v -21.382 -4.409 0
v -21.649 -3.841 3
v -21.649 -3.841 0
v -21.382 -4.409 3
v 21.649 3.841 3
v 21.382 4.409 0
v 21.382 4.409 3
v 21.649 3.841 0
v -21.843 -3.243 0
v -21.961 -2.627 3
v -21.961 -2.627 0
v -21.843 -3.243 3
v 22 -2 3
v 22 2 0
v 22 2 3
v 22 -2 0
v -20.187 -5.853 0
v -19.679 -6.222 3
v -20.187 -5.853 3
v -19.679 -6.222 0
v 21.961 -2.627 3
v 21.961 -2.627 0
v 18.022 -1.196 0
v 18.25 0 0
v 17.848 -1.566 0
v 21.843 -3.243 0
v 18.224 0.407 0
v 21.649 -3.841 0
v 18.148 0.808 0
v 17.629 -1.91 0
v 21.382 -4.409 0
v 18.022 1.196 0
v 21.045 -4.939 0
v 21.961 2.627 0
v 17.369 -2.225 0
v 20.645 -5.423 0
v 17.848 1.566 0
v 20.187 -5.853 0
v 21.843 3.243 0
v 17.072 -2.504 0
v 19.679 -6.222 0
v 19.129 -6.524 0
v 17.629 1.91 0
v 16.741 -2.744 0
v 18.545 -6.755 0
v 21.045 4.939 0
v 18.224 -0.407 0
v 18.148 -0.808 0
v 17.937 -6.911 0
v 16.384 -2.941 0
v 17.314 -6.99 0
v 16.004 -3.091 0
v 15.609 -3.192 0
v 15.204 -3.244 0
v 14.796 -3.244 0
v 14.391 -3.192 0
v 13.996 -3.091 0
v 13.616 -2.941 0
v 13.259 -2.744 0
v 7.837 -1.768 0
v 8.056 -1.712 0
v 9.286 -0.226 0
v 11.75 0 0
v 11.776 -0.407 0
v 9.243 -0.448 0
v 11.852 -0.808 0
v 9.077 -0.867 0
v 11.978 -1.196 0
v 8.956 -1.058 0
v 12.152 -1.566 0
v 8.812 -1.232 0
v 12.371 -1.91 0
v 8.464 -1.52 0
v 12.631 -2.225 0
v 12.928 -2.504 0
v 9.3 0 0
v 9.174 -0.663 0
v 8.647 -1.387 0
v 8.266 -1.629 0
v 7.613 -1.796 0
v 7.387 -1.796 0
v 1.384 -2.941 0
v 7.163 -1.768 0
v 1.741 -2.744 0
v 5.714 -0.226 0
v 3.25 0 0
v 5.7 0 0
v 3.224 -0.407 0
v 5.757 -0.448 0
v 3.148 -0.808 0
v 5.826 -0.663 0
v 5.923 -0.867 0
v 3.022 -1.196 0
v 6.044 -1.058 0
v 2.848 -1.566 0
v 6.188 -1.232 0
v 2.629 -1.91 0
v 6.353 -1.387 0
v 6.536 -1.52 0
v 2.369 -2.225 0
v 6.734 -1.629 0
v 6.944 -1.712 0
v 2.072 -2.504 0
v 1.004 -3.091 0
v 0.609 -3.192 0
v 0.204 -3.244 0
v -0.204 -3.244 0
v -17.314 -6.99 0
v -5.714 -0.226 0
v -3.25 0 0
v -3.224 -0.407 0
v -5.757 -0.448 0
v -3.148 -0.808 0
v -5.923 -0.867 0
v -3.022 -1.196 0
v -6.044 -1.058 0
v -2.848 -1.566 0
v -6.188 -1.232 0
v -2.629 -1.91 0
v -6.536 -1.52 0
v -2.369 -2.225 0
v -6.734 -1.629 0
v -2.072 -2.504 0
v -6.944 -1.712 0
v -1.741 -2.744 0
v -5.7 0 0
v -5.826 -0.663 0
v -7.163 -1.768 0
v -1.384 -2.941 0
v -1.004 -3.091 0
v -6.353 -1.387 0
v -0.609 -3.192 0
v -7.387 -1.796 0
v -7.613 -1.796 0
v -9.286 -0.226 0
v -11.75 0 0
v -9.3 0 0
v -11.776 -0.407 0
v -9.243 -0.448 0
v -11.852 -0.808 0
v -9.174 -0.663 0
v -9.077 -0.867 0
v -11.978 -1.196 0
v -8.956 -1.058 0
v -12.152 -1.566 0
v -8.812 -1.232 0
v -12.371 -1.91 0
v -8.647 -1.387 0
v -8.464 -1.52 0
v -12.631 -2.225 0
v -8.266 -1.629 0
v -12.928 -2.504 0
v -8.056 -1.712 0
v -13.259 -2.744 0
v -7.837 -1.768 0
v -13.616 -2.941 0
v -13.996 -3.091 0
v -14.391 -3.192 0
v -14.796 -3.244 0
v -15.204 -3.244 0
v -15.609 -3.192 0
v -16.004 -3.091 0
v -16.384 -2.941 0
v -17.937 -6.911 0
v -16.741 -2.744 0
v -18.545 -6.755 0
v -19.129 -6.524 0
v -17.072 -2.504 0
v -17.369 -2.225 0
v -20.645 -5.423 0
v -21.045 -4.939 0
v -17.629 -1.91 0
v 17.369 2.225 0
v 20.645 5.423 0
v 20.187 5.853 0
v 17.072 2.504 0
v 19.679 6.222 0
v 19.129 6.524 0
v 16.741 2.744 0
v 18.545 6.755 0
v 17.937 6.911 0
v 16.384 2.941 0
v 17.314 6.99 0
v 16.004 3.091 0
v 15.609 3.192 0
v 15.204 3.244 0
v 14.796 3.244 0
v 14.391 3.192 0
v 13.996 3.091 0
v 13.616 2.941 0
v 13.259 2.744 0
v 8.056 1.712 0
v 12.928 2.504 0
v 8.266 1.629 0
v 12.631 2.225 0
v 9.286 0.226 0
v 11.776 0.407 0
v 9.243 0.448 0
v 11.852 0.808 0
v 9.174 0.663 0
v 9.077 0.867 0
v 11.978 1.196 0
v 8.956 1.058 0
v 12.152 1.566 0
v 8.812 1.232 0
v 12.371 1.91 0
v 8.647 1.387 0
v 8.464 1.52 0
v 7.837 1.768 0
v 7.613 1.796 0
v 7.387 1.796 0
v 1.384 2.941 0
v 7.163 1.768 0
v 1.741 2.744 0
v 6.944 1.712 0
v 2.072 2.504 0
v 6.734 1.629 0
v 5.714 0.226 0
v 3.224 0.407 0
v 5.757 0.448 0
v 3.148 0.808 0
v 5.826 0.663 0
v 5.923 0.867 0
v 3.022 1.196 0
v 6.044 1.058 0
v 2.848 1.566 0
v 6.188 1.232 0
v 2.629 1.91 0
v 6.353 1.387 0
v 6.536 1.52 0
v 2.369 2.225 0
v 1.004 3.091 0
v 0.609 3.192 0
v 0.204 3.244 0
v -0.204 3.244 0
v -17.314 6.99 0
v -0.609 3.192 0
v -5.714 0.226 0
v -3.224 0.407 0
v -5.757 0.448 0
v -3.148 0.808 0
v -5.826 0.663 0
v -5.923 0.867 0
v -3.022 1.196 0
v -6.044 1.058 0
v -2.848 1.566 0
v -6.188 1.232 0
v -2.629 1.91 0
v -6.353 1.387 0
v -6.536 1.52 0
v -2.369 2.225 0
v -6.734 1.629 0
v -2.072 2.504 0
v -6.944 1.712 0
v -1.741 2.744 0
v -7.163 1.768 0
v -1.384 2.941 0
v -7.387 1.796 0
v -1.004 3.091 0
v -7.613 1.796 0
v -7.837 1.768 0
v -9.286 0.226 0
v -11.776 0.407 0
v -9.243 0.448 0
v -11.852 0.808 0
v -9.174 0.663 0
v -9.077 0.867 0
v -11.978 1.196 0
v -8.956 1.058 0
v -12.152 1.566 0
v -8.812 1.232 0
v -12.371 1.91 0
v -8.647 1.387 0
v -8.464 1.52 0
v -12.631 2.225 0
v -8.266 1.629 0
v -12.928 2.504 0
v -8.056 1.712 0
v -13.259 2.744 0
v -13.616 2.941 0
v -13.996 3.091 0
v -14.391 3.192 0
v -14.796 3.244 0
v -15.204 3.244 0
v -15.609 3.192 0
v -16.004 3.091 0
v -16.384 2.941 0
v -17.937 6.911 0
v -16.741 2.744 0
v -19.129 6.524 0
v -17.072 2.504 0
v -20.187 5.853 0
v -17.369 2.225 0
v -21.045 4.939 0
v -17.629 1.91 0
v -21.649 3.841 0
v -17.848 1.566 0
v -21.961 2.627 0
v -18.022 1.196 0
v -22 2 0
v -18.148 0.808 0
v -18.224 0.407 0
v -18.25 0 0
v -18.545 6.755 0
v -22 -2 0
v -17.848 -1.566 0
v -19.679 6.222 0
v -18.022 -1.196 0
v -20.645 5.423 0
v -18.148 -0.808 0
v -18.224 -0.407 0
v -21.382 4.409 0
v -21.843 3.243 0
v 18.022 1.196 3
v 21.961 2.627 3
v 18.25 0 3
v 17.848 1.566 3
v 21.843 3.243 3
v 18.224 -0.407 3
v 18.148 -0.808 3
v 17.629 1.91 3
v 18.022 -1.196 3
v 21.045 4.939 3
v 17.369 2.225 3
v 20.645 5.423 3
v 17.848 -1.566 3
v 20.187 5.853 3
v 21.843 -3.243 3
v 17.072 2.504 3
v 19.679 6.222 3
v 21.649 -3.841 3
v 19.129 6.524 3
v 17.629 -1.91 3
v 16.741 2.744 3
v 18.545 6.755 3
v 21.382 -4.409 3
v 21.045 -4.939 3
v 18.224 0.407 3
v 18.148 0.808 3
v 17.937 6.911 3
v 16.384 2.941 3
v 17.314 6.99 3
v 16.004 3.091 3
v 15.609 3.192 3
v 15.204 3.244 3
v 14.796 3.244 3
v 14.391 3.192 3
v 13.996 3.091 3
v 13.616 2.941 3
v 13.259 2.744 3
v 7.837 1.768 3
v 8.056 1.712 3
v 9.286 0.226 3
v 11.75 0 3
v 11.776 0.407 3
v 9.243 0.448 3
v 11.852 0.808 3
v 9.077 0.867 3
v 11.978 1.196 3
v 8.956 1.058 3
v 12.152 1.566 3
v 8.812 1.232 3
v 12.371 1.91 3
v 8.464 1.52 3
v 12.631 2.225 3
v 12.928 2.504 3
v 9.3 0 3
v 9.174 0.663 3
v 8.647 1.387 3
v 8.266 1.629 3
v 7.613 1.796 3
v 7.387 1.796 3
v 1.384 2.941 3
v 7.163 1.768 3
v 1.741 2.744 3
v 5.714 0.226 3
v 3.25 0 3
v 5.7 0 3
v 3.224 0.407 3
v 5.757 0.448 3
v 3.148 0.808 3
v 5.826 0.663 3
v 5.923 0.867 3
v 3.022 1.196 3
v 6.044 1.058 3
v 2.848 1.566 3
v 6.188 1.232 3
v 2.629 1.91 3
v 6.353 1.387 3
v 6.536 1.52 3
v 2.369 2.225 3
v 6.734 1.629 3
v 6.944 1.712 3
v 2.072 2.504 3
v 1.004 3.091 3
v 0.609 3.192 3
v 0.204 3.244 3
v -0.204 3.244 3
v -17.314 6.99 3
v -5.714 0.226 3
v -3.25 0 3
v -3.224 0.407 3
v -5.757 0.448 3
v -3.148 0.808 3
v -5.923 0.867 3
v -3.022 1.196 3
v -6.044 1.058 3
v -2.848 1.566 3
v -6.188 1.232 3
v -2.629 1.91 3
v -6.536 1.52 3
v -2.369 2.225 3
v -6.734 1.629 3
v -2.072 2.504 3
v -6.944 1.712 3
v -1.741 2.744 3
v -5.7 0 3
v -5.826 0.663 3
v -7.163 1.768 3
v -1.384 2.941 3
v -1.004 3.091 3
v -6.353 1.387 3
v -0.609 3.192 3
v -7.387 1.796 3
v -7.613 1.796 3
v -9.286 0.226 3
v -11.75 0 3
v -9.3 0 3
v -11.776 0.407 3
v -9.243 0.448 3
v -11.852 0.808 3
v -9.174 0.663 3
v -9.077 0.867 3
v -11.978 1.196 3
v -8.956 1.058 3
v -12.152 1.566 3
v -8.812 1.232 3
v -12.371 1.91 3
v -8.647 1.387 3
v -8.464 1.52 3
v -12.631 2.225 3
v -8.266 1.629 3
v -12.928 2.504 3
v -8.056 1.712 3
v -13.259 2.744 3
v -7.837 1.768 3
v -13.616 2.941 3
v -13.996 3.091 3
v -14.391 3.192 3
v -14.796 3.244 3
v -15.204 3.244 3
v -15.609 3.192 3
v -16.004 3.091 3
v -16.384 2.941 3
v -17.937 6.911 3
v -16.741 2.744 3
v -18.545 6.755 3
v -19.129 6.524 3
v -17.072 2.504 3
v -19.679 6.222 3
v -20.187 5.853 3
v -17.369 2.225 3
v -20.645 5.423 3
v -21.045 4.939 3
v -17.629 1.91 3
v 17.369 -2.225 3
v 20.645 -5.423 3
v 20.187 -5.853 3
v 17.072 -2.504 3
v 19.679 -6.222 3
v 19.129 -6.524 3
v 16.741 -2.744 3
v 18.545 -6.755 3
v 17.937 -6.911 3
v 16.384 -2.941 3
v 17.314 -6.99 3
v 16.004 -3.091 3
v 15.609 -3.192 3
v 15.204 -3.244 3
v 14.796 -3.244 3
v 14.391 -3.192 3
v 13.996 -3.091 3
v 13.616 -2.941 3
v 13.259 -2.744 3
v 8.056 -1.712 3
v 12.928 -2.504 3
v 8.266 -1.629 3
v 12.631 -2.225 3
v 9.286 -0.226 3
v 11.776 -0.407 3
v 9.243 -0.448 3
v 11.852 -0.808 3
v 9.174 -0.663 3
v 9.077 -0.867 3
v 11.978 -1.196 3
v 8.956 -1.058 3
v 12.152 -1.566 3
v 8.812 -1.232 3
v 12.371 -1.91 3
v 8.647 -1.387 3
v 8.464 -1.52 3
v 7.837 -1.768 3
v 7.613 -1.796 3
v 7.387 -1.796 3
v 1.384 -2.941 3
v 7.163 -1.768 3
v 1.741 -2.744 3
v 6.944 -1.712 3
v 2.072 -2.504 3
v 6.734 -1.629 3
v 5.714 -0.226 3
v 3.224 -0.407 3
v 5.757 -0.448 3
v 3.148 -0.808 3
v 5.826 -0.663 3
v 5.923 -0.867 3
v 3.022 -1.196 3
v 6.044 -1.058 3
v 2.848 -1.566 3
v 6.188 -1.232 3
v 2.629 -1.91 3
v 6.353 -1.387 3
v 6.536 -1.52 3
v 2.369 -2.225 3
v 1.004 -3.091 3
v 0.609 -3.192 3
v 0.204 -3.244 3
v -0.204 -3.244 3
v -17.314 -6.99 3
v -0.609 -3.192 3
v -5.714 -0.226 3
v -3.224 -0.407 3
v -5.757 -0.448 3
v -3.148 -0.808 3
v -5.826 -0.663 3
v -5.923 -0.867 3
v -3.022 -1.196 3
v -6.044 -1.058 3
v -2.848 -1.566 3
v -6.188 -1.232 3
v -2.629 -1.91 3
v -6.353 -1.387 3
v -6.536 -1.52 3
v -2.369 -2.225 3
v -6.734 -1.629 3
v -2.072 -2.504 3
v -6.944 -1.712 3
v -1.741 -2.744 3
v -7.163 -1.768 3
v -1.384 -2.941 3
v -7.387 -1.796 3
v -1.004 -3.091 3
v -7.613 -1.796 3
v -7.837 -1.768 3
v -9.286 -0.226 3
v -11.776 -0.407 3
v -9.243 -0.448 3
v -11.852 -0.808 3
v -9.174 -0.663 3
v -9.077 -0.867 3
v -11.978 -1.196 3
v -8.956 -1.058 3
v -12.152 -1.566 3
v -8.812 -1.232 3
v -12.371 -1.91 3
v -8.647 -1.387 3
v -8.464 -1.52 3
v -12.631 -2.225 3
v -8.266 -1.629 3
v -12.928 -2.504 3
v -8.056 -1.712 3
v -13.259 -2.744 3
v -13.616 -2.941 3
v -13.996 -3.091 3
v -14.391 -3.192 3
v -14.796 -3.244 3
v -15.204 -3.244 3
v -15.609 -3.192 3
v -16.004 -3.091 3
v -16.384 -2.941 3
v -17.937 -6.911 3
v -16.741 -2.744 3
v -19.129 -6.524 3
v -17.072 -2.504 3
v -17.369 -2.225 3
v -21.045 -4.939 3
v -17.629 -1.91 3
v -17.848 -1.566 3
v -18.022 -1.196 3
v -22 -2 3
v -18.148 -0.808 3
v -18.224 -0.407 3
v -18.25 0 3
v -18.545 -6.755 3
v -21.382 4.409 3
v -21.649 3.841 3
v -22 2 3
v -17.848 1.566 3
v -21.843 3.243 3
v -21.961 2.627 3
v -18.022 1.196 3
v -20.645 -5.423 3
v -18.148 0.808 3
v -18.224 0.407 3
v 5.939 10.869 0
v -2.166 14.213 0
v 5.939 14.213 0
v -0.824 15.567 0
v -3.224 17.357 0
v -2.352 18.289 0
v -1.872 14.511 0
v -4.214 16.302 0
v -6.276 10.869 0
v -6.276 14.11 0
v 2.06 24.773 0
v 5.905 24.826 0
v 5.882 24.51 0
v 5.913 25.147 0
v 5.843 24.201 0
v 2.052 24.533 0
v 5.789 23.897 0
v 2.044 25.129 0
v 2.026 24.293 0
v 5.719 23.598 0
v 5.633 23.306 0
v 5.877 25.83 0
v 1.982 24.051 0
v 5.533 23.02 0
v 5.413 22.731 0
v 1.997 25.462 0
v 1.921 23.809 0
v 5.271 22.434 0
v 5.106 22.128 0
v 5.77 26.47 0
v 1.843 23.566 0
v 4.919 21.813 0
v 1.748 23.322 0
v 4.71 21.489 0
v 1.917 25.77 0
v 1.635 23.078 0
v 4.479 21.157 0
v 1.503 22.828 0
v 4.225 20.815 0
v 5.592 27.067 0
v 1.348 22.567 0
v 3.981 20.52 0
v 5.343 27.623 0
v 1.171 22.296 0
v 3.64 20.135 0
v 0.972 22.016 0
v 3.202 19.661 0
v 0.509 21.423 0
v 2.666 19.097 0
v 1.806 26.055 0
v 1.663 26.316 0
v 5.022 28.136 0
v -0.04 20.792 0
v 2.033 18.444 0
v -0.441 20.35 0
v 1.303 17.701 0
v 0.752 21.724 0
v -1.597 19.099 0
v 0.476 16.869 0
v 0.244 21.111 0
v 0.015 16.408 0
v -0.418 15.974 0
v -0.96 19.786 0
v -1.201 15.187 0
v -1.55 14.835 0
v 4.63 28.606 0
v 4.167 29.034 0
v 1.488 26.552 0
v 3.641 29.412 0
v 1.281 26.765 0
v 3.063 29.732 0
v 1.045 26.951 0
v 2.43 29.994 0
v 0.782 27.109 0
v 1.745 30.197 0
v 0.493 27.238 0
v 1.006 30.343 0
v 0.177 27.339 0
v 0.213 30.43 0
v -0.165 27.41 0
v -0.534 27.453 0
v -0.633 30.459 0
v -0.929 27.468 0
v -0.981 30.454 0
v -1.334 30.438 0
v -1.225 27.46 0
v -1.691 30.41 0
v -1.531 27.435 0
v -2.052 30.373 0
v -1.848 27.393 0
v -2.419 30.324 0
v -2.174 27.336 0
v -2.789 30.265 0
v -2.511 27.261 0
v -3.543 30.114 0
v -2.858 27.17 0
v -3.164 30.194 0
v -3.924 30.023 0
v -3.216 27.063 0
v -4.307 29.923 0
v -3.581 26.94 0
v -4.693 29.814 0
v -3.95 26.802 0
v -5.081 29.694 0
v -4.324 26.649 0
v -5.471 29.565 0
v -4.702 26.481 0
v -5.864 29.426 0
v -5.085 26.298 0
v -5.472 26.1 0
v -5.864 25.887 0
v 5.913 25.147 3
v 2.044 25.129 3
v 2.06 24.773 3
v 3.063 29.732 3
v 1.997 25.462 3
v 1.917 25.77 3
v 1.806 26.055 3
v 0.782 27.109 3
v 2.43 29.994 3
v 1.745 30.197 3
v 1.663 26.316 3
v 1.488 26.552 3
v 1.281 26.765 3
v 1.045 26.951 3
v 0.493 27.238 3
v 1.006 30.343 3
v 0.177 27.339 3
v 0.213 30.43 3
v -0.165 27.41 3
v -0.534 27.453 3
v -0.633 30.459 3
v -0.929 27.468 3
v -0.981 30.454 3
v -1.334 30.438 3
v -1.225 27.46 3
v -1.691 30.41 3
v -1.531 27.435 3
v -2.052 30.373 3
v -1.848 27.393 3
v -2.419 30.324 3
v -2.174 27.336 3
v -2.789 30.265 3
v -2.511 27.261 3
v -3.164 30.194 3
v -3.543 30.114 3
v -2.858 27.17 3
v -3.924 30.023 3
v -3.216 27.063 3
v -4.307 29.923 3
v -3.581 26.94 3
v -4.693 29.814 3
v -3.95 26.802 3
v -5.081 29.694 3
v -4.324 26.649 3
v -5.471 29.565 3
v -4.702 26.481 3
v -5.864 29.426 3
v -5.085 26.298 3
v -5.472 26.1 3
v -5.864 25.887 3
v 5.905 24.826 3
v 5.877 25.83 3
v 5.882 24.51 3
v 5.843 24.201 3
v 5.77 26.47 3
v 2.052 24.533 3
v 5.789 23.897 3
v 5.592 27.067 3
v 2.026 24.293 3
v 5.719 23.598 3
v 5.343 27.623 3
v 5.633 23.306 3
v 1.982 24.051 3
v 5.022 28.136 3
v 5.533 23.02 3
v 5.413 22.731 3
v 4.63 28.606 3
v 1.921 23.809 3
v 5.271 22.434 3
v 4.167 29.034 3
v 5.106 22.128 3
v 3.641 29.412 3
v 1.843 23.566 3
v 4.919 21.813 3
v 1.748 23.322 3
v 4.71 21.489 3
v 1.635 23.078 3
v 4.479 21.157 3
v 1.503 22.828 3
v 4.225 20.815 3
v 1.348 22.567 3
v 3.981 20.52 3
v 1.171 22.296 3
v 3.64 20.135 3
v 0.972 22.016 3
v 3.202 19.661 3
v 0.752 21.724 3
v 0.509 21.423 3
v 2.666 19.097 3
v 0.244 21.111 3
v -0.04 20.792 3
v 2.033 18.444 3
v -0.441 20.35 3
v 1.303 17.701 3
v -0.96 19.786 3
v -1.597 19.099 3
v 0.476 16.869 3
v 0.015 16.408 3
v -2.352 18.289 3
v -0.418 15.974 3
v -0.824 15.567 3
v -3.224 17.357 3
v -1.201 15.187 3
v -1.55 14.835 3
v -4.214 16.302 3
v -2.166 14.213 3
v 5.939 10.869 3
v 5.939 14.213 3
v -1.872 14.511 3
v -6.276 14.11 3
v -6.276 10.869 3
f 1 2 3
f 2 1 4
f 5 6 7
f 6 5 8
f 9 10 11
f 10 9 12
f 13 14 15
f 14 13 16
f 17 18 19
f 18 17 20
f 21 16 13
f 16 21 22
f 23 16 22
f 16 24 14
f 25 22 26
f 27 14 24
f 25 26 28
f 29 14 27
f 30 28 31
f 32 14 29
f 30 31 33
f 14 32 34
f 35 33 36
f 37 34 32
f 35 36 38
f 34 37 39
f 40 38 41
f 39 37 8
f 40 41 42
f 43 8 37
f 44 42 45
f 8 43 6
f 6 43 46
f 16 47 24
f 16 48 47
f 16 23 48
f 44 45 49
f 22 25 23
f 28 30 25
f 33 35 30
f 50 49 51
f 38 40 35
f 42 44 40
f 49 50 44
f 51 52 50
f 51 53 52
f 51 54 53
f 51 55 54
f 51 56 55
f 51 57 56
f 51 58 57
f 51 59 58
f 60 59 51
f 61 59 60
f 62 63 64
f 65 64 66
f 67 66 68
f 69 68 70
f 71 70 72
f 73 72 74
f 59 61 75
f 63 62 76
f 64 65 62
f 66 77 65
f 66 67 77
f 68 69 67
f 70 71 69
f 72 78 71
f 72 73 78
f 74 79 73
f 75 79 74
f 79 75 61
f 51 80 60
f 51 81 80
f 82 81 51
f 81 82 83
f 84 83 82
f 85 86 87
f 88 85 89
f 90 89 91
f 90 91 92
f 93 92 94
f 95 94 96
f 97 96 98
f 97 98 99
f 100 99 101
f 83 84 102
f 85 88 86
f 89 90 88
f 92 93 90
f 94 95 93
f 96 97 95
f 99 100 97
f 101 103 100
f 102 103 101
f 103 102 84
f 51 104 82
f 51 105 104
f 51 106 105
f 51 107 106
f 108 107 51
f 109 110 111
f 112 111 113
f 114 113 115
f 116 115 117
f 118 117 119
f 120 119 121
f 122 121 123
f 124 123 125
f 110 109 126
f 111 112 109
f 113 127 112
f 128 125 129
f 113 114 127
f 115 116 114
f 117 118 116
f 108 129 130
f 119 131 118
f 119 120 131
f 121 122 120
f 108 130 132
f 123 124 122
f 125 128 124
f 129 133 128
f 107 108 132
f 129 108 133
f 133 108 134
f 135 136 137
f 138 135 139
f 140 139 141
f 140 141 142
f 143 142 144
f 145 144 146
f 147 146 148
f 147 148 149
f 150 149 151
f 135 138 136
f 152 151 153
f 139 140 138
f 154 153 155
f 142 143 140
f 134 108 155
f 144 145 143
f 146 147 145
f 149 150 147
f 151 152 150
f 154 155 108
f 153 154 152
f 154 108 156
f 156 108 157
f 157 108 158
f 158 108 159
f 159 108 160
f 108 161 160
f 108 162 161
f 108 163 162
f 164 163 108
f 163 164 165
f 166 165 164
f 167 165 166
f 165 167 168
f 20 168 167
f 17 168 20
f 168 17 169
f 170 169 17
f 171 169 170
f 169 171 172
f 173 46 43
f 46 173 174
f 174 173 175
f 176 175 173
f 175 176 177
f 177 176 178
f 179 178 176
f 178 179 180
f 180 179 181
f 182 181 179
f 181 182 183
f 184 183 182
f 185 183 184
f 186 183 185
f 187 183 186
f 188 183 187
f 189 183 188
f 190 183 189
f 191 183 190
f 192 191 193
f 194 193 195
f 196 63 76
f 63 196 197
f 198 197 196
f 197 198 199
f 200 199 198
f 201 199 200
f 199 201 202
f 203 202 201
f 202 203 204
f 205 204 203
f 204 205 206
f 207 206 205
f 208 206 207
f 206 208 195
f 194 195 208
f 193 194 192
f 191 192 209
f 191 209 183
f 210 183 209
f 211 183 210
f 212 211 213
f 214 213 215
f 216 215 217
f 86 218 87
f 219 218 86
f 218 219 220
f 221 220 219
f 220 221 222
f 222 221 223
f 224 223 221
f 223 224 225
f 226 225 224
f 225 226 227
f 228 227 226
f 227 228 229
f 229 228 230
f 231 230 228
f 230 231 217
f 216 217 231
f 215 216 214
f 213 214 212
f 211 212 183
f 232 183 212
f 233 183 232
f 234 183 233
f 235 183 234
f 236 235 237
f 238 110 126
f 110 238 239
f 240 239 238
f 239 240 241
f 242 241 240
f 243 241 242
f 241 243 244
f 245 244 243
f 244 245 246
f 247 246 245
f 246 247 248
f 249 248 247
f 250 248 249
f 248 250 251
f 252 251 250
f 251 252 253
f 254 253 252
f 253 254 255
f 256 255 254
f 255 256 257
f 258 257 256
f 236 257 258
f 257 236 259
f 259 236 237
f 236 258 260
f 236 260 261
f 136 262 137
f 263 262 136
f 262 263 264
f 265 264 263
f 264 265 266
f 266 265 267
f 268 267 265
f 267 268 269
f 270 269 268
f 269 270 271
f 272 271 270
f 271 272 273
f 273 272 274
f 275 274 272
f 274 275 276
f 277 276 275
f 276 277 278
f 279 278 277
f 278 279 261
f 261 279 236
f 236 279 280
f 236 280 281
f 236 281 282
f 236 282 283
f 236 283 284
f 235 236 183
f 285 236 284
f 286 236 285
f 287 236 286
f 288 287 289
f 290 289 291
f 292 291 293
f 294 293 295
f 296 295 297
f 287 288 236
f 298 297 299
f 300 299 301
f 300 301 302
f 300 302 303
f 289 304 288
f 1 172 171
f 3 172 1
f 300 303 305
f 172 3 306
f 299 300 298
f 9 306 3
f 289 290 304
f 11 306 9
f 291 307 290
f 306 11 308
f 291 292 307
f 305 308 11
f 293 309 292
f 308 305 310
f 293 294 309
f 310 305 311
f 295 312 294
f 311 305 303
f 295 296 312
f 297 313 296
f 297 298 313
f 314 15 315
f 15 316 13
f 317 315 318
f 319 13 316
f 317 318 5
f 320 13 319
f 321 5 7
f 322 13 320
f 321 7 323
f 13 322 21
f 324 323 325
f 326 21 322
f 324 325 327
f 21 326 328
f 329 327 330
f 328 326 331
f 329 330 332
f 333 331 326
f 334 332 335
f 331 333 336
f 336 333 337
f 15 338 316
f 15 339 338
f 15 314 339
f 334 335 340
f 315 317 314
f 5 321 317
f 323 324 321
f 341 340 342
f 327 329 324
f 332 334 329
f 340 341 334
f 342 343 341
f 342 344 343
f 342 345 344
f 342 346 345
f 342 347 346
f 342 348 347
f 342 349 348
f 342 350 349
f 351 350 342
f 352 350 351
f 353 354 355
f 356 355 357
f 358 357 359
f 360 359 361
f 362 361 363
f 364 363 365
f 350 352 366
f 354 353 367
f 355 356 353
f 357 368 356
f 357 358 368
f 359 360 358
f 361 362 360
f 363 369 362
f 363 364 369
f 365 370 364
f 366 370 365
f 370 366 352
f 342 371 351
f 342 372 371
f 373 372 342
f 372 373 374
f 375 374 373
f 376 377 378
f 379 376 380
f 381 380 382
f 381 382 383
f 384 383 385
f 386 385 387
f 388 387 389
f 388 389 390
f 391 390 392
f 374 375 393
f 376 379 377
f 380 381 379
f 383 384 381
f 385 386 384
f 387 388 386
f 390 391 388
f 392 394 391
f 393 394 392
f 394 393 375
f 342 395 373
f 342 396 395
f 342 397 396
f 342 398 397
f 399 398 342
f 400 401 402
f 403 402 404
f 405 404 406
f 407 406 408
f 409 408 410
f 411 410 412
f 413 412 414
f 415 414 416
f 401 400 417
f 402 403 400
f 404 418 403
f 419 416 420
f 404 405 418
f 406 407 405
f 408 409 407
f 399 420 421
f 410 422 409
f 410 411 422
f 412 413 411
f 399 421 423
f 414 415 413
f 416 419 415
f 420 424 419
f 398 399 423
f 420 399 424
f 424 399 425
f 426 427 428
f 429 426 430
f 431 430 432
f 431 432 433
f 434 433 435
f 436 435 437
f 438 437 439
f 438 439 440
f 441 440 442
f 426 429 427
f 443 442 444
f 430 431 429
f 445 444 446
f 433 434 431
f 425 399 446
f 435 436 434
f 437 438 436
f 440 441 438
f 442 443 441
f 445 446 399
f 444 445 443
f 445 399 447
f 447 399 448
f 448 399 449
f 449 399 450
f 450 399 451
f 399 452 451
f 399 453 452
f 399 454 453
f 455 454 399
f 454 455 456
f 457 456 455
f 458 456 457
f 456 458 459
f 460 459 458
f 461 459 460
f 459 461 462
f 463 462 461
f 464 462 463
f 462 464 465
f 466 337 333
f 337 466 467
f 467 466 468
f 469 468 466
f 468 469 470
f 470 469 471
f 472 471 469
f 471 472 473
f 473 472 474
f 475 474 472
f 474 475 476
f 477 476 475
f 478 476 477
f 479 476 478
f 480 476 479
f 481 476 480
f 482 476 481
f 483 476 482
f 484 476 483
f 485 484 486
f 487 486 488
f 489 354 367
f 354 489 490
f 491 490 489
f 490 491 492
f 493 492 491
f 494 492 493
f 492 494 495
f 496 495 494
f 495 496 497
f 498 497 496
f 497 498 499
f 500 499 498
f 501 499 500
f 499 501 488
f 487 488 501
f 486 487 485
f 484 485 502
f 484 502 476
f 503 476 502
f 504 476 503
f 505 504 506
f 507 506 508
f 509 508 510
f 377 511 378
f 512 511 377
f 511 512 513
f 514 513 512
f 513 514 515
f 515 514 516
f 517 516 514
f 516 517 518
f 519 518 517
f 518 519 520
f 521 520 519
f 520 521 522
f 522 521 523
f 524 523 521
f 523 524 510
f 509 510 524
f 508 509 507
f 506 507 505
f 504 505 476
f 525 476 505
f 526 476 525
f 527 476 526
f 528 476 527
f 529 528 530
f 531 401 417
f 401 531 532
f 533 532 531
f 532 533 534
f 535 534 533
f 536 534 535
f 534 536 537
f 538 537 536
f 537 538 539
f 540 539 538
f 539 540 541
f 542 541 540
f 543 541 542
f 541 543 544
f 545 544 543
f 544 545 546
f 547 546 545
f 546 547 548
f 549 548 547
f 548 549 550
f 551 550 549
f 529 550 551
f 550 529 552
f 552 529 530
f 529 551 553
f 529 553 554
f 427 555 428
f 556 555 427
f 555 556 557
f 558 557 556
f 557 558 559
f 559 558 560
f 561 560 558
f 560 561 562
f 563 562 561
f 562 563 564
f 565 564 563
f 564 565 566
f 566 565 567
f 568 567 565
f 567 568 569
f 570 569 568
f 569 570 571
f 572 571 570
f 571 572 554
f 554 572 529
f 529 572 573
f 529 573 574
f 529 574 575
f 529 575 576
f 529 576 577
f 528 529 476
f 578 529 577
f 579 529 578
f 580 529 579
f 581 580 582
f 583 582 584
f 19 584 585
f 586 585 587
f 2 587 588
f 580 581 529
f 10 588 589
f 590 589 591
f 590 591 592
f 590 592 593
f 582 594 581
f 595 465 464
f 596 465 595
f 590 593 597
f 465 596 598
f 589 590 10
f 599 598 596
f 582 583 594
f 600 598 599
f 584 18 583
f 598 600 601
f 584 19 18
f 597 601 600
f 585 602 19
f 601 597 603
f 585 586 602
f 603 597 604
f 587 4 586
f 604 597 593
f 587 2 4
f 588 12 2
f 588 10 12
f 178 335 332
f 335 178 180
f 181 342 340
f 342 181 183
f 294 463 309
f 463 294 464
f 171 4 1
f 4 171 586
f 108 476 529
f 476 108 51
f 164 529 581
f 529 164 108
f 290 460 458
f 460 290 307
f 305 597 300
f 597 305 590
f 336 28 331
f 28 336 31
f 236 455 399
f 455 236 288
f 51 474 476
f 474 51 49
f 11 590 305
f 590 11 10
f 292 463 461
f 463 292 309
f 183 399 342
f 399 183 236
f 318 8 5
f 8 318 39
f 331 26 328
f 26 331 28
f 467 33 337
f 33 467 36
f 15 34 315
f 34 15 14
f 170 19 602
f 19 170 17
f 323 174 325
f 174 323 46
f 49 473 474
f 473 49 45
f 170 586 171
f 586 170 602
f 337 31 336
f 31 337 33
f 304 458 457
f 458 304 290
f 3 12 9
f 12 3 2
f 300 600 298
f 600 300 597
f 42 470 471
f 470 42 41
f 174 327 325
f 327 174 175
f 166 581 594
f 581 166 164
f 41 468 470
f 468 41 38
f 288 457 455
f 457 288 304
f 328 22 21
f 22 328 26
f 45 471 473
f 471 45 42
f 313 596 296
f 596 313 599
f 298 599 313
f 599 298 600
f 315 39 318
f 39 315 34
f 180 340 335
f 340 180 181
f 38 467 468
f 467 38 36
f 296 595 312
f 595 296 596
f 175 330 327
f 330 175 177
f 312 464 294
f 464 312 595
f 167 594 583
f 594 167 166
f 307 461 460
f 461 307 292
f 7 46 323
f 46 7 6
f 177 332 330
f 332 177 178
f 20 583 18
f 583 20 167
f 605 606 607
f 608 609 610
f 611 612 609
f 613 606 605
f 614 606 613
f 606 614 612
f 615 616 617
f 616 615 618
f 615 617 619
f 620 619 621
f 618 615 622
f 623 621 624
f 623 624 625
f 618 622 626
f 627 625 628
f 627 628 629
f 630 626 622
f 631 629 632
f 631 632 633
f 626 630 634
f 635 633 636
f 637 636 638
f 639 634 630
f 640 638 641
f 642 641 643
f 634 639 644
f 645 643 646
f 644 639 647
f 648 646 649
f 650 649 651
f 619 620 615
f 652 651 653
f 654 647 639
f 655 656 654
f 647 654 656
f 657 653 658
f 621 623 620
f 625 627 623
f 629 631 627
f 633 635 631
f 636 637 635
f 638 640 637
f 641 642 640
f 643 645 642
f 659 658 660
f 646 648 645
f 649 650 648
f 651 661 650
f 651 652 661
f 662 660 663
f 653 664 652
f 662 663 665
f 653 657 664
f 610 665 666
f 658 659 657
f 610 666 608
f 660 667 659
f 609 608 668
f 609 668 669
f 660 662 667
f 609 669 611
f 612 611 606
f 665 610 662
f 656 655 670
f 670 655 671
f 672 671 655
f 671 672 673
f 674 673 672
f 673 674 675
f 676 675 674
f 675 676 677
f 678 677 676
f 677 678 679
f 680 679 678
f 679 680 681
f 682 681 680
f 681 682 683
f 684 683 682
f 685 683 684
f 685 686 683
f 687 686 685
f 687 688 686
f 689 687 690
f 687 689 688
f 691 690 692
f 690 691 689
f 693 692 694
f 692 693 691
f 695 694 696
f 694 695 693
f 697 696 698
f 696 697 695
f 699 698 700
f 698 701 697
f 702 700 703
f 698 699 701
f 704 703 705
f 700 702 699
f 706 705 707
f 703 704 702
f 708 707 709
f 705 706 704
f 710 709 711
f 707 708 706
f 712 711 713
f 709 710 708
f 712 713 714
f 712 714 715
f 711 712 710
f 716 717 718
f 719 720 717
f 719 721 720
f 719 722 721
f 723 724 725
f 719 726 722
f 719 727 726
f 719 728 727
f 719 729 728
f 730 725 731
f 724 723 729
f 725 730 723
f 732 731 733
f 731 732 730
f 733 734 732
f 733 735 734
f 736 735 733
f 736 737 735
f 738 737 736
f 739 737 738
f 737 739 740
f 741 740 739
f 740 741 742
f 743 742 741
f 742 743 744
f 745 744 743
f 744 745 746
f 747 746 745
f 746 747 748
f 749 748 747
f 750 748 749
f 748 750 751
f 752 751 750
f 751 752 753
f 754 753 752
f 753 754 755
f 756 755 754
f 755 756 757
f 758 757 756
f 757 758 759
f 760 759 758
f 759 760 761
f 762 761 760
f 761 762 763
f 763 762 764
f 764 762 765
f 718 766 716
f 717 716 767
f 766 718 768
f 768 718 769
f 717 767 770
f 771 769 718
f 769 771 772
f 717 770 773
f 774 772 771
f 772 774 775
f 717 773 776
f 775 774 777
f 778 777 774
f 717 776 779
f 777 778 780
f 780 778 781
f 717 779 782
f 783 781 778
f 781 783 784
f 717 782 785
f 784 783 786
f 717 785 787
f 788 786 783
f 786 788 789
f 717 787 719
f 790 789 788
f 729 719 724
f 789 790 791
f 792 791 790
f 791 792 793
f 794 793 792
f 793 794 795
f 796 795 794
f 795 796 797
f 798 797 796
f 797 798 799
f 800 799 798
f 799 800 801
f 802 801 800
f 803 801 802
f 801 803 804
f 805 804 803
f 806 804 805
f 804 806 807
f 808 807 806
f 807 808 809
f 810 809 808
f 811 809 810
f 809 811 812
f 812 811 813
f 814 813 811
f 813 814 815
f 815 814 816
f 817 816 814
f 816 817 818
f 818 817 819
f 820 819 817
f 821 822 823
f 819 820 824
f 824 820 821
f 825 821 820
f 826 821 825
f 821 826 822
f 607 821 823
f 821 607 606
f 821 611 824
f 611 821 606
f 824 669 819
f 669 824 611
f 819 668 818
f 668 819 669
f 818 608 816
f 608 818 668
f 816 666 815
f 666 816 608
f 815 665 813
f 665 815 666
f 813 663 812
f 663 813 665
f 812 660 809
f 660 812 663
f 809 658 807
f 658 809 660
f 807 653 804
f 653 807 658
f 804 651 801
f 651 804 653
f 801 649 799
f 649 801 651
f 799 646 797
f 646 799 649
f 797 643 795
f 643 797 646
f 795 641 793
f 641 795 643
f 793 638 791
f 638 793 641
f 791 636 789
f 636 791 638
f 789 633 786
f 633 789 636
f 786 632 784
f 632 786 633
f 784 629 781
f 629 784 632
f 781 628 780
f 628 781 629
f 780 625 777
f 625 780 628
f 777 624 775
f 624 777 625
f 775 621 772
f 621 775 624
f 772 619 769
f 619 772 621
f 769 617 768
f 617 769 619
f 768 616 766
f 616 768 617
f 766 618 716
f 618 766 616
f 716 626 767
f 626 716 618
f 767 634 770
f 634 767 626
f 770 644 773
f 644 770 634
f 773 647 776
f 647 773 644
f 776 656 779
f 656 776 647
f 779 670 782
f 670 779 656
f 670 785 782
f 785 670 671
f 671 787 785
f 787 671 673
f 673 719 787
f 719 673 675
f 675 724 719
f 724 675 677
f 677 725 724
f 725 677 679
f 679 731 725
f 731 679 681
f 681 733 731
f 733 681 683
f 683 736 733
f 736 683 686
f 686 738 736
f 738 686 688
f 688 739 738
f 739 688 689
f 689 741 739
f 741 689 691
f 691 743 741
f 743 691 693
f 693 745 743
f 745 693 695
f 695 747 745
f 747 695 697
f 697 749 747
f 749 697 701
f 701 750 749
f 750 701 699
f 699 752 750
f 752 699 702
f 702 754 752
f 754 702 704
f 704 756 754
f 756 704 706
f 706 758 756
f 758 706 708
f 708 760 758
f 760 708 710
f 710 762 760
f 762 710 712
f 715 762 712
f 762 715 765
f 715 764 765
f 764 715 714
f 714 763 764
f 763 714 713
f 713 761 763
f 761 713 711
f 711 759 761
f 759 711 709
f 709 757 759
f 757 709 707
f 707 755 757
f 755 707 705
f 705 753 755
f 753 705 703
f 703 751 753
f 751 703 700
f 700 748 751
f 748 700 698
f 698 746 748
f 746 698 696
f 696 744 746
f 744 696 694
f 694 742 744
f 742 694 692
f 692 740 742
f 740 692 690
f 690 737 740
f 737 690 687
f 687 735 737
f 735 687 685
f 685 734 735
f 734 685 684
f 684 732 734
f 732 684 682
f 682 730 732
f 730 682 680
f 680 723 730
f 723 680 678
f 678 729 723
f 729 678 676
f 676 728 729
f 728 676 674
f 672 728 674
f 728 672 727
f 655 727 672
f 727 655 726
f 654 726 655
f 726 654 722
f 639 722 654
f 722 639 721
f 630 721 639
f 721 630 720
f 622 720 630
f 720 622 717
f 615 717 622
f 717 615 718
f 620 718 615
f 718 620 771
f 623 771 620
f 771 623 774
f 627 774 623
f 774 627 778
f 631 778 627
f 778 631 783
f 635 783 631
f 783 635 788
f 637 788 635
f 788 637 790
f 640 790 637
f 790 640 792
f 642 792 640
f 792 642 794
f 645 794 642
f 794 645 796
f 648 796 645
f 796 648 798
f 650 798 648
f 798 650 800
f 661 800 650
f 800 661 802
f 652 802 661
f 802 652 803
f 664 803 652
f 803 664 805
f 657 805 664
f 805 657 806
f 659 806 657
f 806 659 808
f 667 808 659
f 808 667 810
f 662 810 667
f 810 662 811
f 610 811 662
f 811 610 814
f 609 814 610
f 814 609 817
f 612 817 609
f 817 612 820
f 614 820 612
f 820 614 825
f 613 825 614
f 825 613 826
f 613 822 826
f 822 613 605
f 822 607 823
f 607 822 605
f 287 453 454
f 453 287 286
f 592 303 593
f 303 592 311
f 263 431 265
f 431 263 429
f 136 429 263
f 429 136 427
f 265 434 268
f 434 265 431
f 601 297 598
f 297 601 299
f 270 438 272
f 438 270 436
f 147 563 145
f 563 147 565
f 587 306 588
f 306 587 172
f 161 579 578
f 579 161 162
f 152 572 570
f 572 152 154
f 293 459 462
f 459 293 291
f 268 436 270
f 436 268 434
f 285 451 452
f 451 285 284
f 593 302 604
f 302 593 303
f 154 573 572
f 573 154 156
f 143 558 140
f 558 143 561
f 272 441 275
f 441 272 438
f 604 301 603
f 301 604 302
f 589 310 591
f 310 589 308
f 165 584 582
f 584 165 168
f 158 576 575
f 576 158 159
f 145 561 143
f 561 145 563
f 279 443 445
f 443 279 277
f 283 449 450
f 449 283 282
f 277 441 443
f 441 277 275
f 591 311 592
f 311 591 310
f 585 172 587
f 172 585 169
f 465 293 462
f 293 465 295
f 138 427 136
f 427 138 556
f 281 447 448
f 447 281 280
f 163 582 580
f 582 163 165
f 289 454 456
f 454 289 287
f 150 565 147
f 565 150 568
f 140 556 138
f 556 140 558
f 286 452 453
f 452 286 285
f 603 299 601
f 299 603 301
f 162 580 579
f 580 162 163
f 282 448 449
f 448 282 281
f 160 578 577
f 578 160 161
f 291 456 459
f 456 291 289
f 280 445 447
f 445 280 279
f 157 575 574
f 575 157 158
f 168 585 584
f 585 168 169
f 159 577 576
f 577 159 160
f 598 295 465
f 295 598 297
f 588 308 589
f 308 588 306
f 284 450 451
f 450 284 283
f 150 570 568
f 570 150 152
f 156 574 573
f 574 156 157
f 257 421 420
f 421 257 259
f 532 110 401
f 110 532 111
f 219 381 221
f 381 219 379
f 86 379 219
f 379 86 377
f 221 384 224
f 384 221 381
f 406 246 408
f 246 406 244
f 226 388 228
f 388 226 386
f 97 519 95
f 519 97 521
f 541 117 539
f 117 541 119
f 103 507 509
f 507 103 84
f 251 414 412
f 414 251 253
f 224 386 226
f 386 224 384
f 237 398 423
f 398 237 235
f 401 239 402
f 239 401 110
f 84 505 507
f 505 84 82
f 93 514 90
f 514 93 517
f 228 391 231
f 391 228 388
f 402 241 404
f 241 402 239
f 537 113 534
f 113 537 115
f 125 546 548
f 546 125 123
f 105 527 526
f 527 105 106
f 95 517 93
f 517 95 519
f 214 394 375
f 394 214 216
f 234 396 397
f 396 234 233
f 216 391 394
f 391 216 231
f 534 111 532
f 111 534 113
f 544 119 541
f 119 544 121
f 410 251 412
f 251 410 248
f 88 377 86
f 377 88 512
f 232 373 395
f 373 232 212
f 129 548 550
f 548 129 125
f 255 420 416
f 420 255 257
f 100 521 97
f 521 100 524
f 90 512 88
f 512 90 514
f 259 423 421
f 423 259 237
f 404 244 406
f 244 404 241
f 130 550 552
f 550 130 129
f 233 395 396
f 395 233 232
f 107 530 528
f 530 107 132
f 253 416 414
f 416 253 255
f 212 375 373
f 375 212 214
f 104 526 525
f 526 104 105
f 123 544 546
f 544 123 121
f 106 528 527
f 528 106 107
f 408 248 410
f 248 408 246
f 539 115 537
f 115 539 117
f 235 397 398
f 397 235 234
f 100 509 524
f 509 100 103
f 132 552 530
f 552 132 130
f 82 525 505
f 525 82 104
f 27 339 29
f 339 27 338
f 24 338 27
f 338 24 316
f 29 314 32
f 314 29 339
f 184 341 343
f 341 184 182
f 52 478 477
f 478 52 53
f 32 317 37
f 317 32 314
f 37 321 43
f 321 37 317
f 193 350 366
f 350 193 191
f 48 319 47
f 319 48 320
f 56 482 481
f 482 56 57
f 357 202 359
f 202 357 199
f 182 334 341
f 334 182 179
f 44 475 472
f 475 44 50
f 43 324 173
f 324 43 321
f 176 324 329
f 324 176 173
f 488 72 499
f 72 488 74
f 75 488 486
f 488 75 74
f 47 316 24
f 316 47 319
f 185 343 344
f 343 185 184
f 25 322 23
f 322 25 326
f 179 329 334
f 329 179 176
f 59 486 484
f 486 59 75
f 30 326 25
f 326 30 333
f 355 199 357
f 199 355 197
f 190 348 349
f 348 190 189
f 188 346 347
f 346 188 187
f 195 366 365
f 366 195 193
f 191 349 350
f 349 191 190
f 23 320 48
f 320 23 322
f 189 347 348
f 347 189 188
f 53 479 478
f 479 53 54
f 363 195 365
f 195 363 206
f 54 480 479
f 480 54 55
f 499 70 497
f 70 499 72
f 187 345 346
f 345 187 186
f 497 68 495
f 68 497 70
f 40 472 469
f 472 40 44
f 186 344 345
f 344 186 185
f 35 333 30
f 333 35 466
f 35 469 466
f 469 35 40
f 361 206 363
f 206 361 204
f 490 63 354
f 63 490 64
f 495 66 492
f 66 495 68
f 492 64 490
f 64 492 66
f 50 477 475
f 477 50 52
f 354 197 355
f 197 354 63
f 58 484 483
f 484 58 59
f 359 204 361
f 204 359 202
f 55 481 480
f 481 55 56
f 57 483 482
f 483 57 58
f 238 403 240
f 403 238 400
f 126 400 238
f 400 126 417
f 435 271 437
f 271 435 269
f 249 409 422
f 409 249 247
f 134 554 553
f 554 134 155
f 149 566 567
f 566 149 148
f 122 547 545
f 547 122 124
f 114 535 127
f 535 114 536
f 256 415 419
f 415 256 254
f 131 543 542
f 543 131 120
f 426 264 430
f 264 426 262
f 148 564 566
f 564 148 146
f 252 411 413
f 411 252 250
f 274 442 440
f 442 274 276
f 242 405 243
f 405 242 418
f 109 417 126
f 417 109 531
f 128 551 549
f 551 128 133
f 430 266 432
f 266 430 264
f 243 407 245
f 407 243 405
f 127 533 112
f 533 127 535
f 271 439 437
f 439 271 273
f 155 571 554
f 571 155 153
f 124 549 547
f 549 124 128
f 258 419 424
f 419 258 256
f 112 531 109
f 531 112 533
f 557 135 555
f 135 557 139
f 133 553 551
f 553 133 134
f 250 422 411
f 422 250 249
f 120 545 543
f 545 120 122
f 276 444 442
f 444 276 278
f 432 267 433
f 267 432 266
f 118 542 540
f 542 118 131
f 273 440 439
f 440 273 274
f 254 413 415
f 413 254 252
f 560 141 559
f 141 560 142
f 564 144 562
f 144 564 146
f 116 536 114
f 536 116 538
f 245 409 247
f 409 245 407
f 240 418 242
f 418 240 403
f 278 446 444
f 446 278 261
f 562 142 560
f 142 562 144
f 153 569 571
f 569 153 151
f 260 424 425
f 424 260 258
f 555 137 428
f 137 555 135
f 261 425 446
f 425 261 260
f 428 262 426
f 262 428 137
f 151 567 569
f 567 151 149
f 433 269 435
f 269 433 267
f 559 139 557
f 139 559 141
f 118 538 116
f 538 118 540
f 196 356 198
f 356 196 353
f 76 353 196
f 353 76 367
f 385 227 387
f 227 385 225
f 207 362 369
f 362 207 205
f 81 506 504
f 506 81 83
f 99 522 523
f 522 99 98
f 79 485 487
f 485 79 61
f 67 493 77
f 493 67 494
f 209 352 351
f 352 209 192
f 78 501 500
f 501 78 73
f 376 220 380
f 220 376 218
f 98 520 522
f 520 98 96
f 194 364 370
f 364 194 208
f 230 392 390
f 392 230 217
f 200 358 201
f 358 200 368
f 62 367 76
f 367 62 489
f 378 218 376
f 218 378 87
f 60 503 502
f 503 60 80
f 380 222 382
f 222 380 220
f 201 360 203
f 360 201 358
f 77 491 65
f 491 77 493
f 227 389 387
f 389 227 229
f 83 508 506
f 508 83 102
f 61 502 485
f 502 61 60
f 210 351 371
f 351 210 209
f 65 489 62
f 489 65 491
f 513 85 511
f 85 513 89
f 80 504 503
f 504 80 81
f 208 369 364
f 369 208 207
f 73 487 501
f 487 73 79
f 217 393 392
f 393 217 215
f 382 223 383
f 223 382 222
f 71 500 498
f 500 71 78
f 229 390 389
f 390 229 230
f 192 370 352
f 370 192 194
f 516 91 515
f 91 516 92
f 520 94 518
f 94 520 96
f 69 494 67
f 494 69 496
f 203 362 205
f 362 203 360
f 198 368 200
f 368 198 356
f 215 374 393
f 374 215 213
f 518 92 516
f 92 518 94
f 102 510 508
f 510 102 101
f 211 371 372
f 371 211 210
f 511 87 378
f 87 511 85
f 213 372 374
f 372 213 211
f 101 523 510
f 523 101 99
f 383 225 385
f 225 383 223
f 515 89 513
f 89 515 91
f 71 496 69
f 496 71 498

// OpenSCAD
$fn = 50;


difference() {
	union() {
		hull() {
			translate(v = [-17.0000000000, 2.0000000000, 0]) {
				cylinder(h = 3, r = 5);
			}
			translate(v = [17.0000000000, 2.0000000000, 0]) {
				cylinder(h = 3, r = 5);
			}
			translate(v = [-17.0000000000, -2.0000000000, 0]) {
				cylinder(h = 3, r = 5);
			}
			translate(v = [17.0000000000, -2.0000000000, 0]) {
				cylinder(h = 3, r = 5);
			}
		}
		translate(v = [0, 30.0000000000, 0]) {
			linear_extrude(height = 3) {
				text(font = "DejaVu Sans Mono:style=Bold", halign = "center", size = 19.0000000000, text = "2", valign = "top");
			}
		}
	}
	union() {
		translate(v = [-15.0000000000, 0.0000000000, 0]) {
			translate(v = [0, 0, -100]) {
				cylinder(h = 200, r = 3.2500000000);
			}
		}
		translate(v = [0, 0, -100]) {
			cylinder(h = 200, r = 3.2500000000);
		}
		translate(v = [15.0000000000, 0.0000000000, 0]) {
			translate(v = [0, 0, -100]) {
				cylinder(h = 200, r = 3.2500000000);
			}
		}
		translate(v = [-15.0000000000, 0.0000000000, 0]) {
			translate(v = [0, 0, -100]) {
				cylinder(h = 200, r = 1.8000000000);
			}
		}
		translate(v = [-7.5000000000, 0.0000000000, 0]) {
			translate(v = [0, 0, -100]) {
				cylinder(h = 200, r = 1.8000000000);
			}
		}
		translate(v = [0, 0, -100]) {
			cylinder(h = 200, r = 1.8000000000);
		}
		translate(v = [7.5000000000, 0.0000000000, 0]) {
			translate(v = [0, 0, -100]) {
				cylinder(h = 200, r = 1.8000000000);
			}
		}
		translate(v = [15.0000000000, 0.0000000000, 0]) {
			translate(v = [0, 0, -100]) {
				cylinder(h = 200, r = 1.8000000000);
			}
		}
	}
}
